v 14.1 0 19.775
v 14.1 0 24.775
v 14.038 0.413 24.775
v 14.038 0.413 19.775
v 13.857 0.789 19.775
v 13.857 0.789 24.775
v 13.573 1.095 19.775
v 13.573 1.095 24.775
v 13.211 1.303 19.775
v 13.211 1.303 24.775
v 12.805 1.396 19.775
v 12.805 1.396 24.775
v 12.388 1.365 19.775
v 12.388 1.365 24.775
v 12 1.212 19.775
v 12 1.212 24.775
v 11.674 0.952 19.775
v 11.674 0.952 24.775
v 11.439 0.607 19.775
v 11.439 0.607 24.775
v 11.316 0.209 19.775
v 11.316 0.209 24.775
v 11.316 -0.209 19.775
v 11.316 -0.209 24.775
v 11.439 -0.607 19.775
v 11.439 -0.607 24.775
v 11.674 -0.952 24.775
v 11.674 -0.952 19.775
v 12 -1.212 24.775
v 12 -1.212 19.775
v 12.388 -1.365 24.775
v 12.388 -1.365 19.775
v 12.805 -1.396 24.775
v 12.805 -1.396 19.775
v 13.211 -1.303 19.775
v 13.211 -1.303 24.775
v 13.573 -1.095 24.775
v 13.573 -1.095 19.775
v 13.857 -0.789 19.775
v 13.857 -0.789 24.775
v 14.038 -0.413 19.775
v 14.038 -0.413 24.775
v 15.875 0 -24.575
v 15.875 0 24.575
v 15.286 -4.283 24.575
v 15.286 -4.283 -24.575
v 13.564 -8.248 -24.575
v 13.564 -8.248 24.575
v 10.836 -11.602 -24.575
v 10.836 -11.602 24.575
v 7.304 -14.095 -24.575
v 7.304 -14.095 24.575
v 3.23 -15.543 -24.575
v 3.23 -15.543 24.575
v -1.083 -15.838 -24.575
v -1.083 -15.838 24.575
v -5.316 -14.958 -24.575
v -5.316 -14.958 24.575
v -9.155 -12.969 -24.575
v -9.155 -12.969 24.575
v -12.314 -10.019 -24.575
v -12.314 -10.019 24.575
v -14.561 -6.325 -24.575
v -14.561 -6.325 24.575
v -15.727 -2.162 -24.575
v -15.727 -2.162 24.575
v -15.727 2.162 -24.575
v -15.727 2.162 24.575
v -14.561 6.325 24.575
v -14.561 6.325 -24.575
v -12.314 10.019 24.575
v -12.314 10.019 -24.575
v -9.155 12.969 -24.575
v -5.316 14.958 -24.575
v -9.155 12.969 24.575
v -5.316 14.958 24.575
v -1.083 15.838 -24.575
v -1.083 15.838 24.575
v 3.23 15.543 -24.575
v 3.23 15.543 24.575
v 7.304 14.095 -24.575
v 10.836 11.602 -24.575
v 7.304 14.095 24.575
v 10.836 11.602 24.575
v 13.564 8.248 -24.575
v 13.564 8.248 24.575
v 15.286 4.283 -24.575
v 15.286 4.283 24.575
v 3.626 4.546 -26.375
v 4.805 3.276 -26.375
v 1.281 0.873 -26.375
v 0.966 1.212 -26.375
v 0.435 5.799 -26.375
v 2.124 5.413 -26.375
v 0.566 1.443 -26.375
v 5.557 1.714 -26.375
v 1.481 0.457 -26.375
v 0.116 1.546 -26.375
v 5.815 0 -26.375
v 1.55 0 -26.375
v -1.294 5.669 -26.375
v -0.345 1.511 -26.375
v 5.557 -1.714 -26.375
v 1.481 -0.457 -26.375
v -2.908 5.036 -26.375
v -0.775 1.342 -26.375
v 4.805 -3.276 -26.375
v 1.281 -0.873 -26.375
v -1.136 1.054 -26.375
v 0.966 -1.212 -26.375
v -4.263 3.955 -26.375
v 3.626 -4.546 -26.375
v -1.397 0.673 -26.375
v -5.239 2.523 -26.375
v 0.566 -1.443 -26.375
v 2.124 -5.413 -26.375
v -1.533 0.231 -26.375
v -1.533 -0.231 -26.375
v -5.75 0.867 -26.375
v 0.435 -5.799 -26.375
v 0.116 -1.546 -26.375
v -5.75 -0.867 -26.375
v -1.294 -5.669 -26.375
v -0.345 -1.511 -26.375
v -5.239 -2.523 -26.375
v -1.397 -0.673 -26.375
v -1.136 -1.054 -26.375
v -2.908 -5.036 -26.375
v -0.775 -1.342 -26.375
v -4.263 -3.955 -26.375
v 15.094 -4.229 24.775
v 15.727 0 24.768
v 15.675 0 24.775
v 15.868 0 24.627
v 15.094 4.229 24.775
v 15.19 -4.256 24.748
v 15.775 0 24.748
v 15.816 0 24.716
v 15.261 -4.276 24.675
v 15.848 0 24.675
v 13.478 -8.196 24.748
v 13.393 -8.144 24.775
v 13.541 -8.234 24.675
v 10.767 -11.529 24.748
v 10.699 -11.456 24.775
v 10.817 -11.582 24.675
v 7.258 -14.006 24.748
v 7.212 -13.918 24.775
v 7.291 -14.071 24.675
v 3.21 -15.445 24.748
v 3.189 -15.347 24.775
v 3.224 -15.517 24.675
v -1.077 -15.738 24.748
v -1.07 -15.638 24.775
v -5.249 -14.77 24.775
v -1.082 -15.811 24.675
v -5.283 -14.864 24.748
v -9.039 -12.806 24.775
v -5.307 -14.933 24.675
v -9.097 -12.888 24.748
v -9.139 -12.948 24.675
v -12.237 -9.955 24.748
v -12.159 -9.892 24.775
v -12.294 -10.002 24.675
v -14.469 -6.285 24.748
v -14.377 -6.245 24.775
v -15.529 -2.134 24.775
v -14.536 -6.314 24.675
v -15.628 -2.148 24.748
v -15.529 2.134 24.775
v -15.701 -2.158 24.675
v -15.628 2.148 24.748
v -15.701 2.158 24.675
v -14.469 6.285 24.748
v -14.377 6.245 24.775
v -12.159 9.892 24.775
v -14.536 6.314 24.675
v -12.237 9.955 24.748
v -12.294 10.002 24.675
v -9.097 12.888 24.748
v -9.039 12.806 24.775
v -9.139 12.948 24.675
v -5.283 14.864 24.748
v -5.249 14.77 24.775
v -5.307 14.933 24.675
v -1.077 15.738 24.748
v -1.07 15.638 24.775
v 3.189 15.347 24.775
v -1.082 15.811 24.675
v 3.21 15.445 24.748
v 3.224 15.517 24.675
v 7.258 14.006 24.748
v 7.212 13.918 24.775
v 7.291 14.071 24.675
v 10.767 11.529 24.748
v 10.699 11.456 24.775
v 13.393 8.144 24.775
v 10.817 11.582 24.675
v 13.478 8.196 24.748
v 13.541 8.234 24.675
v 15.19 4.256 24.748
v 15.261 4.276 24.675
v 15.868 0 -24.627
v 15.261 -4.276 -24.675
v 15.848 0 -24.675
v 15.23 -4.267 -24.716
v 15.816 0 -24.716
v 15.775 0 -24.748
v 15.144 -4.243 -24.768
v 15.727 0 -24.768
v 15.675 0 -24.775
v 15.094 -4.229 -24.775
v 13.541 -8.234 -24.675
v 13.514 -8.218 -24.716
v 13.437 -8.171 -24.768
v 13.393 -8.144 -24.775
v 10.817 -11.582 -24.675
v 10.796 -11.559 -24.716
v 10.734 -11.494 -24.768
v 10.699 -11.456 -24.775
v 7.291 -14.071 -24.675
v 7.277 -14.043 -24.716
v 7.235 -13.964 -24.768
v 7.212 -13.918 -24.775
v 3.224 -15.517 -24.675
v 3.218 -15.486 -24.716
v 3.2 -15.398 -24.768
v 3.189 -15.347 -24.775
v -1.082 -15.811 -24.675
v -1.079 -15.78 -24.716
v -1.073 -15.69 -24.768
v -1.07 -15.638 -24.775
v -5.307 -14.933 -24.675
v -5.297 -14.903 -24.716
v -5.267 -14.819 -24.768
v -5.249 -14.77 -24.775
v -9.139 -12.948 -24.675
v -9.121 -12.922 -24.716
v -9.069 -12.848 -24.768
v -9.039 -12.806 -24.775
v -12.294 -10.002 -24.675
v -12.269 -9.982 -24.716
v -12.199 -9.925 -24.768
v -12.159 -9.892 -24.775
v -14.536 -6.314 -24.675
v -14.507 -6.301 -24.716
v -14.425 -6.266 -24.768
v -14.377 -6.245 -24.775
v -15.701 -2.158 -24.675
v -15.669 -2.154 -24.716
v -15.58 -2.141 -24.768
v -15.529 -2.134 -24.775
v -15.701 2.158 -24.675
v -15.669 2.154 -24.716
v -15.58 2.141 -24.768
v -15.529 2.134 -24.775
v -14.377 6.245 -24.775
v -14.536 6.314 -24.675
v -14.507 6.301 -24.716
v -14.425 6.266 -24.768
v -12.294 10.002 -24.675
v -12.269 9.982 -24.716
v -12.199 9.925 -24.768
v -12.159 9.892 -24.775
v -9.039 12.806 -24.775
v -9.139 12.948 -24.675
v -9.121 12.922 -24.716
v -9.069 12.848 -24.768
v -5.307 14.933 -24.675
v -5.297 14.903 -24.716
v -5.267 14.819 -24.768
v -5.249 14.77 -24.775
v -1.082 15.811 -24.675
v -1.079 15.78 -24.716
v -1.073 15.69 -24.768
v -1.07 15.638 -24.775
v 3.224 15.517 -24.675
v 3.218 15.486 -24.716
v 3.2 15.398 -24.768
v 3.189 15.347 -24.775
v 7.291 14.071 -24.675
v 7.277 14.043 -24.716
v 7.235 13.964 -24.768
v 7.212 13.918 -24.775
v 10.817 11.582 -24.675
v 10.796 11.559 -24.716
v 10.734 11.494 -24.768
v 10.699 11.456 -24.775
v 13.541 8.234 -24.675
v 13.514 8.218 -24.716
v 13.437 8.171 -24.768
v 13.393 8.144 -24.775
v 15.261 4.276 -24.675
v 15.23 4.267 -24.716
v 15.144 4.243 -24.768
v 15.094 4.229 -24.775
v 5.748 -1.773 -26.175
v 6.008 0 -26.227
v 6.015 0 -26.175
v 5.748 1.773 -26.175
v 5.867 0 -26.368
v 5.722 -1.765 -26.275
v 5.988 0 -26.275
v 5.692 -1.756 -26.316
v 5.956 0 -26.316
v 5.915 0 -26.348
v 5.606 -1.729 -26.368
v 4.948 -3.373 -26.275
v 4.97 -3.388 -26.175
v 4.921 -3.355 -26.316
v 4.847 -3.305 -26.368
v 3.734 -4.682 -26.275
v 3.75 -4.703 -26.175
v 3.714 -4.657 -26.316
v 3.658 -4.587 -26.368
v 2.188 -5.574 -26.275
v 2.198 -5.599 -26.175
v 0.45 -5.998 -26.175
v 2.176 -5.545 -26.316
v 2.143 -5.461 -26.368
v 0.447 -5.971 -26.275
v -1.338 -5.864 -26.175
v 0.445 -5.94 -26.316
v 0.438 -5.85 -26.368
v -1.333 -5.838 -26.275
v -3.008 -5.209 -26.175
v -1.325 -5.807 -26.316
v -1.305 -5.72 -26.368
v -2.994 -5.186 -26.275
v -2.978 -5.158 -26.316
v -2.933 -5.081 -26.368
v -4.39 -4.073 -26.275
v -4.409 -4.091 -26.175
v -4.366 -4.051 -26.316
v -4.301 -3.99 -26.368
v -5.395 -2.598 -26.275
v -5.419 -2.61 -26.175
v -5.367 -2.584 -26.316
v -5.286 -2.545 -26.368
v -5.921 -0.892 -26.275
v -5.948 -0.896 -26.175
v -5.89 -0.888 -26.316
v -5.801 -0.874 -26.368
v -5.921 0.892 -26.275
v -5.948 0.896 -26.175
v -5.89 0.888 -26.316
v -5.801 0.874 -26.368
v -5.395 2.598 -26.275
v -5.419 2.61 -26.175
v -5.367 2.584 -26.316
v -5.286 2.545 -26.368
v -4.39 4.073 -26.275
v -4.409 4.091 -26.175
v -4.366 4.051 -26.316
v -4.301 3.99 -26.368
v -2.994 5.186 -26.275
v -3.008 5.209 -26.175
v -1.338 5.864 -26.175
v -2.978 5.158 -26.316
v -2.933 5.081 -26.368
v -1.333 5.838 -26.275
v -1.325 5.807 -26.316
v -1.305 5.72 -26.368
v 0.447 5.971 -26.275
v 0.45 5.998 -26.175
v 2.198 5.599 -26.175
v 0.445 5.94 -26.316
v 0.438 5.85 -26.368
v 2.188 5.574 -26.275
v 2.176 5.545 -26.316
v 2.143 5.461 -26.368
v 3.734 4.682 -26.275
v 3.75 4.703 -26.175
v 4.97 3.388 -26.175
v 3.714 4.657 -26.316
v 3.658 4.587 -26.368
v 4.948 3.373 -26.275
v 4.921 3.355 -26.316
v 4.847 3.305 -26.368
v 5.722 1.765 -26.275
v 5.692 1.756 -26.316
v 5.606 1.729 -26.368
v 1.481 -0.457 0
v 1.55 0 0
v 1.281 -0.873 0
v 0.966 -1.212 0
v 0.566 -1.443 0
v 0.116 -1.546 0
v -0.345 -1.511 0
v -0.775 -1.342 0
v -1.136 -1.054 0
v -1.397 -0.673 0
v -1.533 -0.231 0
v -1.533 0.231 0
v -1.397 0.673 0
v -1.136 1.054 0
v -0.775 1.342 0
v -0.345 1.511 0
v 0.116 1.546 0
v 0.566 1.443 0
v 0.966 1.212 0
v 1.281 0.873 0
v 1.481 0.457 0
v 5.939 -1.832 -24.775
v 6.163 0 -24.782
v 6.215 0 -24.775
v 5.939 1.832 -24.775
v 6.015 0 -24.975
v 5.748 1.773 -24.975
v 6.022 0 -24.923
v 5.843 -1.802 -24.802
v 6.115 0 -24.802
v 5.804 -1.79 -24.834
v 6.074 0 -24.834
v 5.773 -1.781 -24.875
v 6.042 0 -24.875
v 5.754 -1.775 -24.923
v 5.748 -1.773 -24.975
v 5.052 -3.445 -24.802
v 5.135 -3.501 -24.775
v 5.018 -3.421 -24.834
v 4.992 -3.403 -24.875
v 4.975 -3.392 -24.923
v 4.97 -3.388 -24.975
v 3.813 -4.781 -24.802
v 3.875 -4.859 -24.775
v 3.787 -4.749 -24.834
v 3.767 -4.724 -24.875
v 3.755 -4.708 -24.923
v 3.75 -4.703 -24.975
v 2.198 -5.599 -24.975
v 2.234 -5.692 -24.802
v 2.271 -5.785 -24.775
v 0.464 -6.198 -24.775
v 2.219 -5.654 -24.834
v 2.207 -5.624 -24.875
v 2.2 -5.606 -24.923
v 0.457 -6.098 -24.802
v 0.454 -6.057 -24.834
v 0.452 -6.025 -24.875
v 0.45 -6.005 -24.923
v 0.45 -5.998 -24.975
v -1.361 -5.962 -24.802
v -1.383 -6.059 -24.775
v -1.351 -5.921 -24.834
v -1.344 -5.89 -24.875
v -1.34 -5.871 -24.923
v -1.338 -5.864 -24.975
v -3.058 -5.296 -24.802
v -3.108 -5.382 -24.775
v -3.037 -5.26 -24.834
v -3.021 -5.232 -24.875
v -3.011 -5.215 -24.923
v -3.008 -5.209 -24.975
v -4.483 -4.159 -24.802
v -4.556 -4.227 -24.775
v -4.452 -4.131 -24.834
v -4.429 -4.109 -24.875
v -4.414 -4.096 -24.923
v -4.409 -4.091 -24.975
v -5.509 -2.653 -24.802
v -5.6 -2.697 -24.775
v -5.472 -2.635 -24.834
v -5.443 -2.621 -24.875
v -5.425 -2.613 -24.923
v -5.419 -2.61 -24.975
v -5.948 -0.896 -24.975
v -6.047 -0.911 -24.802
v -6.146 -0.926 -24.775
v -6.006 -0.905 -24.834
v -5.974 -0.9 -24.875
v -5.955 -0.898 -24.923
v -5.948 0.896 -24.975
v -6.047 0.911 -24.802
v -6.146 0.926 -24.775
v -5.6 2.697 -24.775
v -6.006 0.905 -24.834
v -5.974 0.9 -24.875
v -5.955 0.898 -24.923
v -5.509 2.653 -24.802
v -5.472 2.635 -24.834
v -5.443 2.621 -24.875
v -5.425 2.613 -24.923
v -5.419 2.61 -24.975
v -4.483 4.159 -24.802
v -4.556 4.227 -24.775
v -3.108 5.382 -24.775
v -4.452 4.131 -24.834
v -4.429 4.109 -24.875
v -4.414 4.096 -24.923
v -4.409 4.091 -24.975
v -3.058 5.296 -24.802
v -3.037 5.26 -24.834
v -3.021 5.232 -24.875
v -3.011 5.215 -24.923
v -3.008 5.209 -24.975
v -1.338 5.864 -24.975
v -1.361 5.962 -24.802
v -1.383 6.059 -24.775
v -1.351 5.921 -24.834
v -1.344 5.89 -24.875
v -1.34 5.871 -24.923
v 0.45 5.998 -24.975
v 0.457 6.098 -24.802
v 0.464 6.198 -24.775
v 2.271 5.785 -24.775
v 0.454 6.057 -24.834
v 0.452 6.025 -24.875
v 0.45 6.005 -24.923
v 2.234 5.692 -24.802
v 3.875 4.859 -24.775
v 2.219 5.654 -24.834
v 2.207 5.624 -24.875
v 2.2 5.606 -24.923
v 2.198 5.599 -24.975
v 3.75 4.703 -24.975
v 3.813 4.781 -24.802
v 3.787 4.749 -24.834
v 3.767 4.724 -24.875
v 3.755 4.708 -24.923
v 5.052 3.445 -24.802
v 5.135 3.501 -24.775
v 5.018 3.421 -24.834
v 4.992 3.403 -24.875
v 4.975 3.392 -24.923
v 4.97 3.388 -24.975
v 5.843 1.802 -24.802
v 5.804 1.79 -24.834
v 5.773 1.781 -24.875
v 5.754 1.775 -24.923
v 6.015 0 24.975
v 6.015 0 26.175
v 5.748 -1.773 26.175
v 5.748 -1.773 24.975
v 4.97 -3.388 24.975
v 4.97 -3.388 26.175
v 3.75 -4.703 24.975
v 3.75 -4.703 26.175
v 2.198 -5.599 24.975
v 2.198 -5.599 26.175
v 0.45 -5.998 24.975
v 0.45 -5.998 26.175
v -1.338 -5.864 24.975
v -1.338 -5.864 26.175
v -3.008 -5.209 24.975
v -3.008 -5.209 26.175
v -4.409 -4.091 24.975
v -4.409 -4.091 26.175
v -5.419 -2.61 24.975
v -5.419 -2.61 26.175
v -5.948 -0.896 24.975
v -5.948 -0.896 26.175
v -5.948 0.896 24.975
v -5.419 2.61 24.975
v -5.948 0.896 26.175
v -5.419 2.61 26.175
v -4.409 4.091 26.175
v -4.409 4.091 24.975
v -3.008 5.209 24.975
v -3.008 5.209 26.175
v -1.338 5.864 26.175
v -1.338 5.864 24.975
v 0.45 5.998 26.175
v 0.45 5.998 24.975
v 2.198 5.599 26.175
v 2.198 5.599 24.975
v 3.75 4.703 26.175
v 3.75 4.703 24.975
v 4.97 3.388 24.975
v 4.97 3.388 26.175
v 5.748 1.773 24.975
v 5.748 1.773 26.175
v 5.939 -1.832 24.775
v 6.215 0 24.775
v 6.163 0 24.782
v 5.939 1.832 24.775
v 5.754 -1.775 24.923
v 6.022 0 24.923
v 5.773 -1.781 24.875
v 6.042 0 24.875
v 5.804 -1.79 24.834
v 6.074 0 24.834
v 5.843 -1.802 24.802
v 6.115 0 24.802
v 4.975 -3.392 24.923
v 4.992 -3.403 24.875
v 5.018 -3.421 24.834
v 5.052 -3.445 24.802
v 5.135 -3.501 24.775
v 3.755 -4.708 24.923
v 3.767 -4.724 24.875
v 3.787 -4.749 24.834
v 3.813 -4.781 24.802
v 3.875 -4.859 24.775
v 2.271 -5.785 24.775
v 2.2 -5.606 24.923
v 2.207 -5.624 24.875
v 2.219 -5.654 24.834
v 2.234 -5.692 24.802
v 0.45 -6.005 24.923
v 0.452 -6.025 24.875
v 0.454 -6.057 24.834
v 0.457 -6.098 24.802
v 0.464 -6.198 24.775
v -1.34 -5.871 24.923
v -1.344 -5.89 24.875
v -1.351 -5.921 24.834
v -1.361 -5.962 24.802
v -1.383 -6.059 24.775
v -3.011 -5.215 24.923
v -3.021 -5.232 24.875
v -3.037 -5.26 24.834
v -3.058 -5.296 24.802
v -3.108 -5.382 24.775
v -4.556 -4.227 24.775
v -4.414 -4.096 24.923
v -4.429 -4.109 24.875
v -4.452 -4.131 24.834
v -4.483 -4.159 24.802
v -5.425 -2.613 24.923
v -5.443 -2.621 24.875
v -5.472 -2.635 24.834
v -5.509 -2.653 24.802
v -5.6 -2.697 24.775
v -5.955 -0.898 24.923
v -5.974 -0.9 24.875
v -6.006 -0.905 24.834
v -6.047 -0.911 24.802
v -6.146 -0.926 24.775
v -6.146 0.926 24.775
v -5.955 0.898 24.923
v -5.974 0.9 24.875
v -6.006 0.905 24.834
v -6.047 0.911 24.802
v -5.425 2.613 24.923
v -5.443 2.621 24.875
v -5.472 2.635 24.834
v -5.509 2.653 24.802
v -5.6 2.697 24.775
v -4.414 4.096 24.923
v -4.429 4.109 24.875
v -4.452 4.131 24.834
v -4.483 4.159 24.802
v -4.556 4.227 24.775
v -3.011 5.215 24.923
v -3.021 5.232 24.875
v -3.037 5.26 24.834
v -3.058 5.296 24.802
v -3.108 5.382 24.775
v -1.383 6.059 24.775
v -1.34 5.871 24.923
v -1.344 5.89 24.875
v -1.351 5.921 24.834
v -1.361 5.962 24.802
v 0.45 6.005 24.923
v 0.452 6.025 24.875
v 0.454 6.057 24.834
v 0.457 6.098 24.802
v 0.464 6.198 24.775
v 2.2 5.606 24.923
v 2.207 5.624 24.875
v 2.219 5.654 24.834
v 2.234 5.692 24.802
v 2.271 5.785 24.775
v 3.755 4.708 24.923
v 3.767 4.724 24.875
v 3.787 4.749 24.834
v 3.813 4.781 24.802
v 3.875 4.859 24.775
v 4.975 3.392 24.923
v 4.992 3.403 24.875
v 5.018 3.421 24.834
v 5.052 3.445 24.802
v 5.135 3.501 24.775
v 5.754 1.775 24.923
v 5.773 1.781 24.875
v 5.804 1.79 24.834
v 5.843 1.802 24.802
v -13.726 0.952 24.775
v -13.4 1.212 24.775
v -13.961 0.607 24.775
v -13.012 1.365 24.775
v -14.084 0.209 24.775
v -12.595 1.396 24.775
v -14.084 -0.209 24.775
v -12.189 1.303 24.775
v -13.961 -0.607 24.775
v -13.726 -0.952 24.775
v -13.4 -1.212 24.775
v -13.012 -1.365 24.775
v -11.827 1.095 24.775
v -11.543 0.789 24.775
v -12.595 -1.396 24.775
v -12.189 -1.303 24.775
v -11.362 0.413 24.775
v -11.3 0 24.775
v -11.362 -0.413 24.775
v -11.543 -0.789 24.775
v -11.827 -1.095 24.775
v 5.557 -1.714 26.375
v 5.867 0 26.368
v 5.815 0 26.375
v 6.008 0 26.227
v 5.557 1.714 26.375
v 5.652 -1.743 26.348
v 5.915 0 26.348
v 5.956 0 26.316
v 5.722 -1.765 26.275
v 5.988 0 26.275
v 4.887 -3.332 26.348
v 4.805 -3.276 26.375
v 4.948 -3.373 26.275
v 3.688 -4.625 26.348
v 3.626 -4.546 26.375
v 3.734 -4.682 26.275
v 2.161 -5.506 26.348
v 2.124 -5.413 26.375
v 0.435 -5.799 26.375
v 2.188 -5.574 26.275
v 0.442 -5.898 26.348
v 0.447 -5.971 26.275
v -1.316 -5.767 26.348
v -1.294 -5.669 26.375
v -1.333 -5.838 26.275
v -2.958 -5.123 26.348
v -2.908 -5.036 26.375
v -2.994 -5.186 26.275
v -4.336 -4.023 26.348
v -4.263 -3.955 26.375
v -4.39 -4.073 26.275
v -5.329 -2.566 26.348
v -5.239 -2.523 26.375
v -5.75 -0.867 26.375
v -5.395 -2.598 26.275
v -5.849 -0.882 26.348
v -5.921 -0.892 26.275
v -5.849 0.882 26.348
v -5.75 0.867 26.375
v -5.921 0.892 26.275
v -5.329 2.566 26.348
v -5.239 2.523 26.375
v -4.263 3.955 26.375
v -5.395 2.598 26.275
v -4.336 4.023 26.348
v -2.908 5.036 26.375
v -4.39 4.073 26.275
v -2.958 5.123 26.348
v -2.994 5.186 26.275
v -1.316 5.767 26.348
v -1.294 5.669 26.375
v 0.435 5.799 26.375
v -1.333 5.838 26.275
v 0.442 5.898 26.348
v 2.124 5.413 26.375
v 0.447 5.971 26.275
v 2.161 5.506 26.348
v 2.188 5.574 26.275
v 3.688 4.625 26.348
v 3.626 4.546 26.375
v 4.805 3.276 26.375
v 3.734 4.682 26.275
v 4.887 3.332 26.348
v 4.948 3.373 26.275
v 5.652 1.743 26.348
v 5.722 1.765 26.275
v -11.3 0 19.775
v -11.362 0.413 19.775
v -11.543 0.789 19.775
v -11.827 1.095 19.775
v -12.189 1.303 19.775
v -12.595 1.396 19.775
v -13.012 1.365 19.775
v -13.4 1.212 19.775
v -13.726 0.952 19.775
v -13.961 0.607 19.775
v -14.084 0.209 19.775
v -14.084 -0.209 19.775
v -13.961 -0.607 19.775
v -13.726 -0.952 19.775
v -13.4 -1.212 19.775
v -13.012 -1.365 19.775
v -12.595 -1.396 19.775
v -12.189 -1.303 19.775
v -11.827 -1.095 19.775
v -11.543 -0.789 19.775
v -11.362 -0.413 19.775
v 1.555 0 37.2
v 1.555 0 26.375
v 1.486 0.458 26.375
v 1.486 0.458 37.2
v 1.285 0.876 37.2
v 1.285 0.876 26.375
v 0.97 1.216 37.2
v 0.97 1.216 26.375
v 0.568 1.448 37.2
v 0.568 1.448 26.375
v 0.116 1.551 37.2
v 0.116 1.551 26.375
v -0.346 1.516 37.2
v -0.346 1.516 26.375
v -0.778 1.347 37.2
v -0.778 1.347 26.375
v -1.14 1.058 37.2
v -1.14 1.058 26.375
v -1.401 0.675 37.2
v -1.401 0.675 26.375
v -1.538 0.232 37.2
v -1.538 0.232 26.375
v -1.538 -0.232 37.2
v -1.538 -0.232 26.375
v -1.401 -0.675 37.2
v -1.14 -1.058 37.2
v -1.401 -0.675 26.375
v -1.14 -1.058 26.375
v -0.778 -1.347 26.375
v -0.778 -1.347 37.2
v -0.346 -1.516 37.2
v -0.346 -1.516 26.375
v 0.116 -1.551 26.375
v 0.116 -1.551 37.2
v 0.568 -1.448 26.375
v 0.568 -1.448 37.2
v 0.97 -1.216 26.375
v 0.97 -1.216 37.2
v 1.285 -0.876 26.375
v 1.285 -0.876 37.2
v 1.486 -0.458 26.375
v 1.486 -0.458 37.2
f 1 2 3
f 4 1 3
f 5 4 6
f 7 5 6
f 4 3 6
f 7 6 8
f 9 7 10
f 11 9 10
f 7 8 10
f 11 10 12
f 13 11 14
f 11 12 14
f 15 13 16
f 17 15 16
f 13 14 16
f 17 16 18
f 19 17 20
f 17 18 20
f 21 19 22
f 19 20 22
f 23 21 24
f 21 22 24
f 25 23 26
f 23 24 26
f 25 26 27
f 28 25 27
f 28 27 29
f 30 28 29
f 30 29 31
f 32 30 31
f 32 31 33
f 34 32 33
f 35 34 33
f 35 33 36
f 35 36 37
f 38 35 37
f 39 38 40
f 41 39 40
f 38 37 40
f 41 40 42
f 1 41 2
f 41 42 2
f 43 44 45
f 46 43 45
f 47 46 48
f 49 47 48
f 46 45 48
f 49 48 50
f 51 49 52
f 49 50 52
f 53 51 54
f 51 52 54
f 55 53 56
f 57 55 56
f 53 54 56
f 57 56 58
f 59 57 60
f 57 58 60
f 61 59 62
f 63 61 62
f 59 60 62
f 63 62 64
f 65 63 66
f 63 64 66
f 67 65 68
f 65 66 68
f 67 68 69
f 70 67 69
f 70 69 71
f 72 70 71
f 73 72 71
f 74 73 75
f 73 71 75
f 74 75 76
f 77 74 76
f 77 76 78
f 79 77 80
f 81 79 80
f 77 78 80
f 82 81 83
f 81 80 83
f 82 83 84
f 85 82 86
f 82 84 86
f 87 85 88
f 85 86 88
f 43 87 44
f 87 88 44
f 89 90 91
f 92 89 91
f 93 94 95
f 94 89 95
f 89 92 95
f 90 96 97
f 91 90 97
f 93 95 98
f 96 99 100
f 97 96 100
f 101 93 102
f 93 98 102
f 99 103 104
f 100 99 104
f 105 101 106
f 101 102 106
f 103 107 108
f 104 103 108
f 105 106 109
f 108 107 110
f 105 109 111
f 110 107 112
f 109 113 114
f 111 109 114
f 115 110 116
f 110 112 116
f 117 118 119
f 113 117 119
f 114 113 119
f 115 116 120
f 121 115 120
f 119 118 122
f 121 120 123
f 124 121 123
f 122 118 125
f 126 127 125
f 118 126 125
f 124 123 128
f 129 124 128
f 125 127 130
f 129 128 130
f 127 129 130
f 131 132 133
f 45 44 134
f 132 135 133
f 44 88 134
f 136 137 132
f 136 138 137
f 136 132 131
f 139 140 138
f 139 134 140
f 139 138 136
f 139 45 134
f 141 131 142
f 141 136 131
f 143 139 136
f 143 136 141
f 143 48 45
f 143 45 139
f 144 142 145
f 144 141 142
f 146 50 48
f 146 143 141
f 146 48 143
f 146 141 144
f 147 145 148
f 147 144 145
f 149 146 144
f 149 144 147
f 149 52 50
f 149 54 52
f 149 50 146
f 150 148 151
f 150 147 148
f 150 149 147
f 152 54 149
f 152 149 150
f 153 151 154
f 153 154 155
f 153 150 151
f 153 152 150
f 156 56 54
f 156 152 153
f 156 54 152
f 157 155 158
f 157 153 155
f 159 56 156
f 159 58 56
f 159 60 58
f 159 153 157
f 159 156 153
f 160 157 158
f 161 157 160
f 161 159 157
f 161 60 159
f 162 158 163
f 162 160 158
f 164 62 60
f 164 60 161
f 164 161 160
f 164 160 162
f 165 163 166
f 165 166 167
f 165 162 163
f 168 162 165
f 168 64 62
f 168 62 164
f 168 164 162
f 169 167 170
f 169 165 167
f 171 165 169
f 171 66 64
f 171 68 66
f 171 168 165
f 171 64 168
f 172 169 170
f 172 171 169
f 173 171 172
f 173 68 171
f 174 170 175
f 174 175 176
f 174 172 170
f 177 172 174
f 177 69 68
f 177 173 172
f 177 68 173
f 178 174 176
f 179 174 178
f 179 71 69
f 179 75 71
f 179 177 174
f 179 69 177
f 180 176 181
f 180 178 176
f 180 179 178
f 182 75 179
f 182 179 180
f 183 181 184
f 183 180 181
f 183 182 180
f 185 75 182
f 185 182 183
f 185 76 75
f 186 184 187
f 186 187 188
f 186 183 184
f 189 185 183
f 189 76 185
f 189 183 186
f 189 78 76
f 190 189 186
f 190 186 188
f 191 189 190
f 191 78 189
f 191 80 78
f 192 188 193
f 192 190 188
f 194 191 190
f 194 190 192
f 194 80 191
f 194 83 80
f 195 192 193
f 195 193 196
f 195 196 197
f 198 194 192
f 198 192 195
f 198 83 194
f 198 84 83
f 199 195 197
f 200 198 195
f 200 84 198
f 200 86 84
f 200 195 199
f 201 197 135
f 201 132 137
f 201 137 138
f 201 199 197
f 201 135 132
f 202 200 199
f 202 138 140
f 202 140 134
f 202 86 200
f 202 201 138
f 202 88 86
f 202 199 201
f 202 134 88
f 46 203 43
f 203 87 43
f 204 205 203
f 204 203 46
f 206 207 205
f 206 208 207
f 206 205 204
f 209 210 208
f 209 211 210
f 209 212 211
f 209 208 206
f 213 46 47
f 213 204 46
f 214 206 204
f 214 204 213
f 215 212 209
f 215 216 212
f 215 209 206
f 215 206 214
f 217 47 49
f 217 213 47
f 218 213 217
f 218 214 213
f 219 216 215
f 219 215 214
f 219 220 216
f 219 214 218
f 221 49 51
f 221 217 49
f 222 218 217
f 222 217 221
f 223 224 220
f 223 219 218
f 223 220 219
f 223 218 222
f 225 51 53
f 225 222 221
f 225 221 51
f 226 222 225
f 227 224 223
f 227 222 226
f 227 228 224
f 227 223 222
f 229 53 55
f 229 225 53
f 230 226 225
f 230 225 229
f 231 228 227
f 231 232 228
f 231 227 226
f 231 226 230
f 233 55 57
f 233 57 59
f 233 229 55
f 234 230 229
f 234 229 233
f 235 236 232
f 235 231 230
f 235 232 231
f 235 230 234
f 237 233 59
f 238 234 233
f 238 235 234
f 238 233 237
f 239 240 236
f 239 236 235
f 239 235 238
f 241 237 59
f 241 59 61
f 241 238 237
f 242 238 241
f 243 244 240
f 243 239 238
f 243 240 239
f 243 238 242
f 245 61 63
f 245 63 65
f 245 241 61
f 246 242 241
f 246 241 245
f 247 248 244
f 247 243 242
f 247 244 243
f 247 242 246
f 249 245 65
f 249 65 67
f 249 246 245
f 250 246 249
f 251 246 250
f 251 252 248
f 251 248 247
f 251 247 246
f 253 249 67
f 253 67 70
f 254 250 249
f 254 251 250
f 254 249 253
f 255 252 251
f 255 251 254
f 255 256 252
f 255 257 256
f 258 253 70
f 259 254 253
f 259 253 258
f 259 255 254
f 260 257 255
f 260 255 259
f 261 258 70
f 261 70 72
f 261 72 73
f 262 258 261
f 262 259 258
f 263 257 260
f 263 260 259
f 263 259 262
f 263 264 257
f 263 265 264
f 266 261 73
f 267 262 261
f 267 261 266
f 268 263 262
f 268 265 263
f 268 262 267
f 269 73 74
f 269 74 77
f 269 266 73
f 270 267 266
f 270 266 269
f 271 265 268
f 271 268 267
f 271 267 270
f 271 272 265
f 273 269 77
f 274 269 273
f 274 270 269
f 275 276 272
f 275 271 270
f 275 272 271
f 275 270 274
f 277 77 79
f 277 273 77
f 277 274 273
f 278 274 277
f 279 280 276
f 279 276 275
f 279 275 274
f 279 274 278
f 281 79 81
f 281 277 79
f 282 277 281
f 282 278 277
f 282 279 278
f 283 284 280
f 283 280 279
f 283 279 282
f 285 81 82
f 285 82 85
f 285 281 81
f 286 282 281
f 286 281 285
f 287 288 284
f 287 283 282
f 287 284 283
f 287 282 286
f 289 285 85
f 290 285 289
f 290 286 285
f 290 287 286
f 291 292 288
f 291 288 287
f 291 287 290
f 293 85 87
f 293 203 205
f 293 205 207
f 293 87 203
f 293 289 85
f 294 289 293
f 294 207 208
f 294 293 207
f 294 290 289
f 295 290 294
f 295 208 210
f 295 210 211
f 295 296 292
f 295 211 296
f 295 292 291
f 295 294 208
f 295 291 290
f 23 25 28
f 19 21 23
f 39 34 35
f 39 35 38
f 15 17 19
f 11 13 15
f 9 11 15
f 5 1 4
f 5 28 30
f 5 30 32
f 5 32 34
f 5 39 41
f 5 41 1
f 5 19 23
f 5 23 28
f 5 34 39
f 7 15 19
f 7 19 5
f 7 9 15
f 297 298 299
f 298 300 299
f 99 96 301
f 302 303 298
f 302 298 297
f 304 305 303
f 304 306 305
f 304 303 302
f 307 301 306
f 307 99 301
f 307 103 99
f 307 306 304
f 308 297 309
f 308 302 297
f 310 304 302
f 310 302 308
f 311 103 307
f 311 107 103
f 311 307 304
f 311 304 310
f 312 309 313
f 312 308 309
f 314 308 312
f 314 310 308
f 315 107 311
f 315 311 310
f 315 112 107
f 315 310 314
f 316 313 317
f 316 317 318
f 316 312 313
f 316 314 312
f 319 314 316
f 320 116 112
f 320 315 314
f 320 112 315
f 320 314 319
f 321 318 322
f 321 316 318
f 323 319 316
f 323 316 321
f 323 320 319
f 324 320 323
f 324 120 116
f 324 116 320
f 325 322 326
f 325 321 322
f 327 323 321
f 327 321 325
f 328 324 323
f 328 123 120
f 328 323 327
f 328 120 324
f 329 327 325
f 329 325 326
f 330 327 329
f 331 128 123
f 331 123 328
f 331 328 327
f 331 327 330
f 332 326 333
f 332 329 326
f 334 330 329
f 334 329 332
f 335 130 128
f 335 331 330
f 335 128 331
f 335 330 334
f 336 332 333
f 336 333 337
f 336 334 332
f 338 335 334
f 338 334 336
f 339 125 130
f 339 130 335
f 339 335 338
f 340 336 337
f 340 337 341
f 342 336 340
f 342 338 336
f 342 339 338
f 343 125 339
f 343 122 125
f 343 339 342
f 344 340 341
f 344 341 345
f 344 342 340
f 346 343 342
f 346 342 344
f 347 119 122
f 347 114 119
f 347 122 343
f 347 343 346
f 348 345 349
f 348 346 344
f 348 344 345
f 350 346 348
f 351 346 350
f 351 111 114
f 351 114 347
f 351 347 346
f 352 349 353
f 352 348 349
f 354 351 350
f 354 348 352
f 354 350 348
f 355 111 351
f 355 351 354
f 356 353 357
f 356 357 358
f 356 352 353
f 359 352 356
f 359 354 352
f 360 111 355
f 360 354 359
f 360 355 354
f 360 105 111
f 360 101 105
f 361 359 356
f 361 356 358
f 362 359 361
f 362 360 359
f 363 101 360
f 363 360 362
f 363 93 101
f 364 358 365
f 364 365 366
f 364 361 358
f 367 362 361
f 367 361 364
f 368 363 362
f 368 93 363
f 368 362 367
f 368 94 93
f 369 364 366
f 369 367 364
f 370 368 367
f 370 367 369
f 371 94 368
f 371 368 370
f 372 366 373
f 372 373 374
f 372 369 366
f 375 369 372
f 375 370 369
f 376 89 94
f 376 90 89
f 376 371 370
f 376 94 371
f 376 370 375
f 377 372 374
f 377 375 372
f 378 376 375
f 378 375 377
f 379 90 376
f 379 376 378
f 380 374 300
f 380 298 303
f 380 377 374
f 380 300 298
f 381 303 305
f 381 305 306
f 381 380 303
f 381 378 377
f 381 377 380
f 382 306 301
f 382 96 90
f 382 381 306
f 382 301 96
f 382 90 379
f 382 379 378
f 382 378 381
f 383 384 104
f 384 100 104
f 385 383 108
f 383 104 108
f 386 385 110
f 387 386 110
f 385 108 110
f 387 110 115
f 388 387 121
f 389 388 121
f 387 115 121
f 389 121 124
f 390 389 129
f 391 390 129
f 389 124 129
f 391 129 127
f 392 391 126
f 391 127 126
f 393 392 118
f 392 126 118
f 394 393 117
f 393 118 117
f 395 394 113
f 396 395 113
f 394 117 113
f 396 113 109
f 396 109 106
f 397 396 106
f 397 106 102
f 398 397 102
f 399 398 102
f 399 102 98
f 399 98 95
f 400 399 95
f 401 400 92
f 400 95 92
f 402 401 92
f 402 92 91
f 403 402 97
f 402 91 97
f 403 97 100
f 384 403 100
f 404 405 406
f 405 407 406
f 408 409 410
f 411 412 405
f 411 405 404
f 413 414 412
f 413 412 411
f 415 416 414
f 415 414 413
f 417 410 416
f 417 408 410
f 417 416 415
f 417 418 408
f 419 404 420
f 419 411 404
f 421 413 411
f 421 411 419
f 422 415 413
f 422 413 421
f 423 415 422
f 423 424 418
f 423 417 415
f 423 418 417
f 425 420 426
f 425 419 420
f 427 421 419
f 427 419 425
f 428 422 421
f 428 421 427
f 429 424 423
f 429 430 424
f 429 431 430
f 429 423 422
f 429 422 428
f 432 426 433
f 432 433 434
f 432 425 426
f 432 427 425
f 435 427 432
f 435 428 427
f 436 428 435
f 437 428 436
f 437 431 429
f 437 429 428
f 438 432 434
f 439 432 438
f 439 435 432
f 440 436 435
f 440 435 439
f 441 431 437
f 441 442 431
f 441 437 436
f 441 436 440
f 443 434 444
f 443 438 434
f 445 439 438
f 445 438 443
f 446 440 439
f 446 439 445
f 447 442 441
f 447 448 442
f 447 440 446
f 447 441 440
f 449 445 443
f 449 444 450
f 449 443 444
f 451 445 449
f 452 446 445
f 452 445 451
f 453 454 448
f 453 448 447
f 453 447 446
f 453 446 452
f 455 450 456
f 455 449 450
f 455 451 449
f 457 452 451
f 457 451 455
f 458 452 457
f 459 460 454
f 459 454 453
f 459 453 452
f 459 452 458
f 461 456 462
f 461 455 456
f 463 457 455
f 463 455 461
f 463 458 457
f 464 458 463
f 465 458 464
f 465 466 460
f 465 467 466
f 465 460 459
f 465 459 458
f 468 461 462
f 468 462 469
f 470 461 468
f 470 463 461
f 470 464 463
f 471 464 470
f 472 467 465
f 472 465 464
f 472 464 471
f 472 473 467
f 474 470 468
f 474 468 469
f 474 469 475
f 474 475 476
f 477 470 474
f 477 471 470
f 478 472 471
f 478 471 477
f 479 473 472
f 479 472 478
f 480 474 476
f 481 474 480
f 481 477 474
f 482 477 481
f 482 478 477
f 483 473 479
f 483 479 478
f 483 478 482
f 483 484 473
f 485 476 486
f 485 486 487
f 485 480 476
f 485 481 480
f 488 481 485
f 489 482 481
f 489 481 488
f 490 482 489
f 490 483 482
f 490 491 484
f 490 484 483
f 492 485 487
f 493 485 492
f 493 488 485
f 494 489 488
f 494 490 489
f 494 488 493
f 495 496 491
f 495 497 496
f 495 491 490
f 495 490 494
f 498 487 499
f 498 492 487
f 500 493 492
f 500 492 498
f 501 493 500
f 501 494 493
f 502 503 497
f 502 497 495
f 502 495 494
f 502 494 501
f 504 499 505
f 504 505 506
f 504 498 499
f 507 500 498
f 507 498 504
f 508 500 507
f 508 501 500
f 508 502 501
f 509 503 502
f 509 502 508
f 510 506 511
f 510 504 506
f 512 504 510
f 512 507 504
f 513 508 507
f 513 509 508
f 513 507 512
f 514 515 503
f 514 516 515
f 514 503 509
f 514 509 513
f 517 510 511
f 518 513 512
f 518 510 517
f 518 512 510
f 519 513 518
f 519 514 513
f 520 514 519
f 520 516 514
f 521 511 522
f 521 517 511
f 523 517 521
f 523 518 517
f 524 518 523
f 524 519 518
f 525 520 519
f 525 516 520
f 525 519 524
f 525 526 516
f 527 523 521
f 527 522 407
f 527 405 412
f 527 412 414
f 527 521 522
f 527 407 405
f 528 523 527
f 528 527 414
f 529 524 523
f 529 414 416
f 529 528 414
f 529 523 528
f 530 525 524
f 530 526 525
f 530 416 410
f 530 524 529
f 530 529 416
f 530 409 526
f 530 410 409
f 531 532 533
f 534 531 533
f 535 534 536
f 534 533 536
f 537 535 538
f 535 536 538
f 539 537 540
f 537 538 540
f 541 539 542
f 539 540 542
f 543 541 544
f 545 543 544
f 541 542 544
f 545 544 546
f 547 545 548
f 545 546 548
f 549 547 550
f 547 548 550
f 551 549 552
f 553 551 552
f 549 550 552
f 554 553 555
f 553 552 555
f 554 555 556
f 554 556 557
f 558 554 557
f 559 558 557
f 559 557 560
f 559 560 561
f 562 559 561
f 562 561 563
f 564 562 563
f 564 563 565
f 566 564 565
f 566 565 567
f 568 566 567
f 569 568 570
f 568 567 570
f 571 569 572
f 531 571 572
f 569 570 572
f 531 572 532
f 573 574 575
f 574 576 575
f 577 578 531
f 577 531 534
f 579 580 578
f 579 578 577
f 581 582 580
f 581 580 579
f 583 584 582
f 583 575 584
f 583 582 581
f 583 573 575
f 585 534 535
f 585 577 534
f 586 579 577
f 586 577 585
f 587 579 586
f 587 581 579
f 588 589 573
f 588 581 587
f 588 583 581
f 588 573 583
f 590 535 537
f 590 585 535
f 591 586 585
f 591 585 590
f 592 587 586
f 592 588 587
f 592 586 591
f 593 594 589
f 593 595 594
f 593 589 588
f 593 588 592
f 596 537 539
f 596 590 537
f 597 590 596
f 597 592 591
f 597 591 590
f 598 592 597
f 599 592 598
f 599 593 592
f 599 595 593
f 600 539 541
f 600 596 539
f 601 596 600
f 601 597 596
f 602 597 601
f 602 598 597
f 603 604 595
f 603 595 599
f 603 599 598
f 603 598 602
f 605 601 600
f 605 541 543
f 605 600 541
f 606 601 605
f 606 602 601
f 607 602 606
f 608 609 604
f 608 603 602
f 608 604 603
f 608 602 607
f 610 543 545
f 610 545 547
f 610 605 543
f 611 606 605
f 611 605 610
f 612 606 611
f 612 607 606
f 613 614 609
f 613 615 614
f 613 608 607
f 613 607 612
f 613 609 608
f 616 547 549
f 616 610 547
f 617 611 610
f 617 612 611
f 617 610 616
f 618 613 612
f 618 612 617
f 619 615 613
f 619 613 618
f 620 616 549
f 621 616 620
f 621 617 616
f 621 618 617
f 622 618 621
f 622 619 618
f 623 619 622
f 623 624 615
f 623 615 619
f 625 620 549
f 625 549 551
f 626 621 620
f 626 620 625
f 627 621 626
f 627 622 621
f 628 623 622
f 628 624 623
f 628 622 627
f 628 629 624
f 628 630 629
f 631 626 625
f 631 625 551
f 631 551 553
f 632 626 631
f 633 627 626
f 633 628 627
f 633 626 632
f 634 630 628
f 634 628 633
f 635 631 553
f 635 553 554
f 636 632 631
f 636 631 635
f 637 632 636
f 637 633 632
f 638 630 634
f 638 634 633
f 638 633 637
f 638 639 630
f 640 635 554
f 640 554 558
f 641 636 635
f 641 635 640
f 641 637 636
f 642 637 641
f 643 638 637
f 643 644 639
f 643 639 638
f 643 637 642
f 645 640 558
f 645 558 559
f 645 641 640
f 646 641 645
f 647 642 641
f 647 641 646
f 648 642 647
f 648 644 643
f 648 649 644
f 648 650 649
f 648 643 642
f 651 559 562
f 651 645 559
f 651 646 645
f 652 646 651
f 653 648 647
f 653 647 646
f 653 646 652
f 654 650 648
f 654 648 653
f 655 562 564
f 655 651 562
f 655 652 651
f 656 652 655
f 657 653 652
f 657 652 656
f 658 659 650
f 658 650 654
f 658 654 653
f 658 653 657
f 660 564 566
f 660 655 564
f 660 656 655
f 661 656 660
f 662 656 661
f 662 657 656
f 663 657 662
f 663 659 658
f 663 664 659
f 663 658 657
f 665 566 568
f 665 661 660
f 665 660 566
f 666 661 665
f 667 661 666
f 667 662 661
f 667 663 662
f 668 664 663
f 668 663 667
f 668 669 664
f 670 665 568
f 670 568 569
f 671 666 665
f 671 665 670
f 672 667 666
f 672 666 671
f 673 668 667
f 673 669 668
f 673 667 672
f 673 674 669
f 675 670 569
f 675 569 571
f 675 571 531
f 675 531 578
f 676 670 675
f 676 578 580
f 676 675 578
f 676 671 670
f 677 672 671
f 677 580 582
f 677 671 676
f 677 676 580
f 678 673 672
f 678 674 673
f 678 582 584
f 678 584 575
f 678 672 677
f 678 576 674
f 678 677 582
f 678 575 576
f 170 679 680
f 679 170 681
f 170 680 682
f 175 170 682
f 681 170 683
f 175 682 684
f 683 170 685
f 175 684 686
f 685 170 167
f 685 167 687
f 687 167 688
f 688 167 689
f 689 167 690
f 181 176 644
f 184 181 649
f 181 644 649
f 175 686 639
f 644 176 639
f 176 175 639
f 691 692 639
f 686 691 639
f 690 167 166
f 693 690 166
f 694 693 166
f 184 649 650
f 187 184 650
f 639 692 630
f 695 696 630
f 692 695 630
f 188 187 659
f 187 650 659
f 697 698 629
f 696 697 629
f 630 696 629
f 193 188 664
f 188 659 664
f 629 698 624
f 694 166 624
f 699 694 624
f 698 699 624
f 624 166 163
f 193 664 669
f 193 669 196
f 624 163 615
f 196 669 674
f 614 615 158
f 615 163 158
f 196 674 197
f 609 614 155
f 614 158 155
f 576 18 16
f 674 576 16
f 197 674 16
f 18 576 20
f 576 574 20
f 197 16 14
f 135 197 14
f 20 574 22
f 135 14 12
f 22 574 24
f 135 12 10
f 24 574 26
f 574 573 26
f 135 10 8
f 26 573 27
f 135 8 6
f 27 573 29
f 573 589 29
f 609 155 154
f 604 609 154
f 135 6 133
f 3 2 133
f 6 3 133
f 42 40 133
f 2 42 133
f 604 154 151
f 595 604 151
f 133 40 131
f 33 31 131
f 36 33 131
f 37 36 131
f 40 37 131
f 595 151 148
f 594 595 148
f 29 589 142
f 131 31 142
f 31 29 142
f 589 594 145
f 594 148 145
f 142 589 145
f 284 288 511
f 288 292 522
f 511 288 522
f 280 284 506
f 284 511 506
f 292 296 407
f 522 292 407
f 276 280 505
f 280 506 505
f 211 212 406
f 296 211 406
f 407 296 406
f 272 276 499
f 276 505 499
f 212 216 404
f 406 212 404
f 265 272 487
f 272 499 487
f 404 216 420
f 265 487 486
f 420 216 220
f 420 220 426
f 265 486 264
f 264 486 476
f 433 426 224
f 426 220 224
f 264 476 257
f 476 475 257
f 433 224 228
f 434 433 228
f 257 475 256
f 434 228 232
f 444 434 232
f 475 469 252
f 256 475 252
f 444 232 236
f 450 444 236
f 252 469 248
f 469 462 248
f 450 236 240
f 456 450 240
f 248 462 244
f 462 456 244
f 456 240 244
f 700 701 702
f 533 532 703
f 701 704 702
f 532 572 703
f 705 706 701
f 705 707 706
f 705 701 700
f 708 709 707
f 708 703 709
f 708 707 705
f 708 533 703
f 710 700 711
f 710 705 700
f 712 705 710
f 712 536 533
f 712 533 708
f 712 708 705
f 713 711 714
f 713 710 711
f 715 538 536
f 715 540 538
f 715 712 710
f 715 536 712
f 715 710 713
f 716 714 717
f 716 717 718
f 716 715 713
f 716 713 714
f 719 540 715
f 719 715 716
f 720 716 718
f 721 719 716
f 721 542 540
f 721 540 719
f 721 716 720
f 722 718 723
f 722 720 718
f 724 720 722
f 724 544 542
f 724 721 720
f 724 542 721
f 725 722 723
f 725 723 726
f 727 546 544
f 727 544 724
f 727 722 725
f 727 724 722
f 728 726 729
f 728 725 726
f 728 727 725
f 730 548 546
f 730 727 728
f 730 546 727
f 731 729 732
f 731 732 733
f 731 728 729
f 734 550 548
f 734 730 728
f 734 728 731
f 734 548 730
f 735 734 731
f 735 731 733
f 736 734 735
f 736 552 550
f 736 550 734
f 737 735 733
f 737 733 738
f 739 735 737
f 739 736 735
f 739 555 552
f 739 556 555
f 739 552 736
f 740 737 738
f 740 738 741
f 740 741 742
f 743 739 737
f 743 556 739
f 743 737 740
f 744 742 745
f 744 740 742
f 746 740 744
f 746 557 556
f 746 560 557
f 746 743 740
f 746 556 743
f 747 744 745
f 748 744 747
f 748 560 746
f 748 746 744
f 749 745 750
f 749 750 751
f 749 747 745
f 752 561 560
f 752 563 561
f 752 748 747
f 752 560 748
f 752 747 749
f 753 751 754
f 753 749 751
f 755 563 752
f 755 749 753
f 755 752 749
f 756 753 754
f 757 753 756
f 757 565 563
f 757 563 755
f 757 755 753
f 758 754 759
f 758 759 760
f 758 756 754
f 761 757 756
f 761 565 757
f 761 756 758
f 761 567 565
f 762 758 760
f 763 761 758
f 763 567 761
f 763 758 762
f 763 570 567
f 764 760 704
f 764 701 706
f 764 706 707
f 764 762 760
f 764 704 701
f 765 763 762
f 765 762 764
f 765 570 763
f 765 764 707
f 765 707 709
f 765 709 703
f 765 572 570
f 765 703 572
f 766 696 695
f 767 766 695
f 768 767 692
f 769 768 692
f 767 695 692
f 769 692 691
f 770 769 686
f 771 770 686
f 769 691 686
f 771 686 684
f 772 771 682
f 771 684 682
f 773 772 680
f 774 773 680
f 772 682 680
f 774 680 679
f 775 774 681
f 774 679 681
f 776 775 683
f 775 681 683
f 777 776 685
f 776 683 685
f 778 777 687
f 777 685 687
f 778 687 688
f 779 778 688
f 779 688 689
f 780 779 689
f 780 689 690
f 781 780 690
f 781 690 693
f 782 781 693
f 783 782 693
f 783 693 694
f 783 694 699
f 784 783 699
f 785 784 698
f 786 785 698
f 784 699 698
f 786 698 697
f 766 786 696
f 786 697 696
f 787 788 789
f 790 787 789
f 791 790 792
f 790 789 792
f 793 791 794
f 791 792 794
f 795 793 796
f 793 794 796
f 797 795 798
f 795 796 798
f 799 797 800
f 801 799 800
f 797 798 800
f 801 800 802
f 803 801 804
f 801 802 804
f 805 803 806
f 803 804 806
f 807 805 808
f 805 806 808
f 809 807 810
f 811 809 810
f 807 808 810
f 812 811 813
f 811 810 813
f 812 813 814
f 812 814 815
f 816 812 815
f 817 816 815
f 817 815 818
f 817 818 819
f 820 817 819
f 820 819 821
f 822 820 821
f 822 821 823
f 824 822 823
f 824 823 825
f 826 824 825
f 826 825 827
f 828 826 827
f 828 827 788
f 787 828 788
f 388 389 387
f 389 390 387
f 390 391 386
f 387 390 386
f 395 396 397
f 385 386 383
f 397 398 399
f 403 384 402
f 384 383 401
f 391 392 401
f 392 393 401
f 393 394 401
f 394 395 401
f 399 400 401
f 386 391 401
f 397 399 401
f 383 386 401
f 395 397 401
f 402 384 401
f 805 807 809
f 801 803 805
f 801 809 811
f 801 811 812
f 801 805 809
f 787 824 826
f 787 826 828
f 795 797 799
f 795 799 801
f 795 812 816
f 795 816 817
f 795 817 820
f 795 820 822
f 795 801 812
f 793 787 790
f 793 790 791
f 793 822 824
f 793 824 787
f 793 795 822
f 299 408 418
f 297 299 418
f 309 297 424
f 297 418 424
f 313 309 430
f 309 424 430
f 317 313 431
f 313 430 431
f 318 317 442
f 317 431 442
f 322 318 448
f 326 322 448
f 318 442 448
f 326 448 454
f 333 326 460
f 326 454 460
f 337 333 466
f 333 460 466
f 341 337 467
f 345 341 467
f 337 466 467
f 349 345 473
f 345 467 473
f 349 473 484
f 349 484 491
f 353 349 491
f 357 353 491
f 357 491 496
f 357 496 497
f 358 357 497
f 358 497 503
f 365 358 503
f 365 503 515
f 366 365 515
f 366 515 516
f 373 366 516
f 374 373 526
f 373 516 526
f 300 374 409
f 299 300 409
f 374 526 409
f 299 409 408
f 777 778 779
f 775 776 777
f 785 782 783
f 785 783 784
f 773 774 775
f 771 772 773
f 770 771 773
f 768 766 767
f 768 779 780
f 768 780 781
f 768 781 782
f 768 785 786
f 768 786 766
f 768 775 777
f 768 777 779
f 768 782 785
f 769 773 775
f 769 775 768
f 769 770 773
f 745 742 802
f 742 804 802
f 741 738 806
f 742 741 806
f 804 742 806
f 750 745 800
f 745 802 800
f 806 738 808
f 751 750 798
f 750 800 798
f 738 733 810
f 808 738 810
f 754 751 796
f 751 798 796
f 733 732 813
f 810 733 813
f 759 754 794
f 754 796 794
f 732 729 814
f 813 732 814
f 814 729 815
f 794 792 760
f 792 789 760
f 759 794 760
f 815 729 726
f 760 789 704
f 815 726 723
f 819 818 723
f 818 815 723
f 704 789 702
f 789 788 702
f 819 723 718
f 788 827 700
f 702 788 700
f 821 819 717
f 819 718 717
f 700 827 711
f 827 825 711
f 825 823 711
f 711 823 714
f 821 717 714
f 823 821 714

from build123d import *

# Parameters (mm, degrees)
SKETCH4_R             = 1.555
SHAFT_DEPTH           = 37.2
FILLET1_R             = 0.2
SKETCH6_R             = 1.4
F_6_32_THREADED_DEPTH = 5


with BuildPart() as part:
    # Sketch2 → body (revolve)
    with BuildSketch(Plane(origin=(0, 0, 0), x_dir=(1, 0, 0), z_dir=(0, 1, 0))):
        Polygon((1.55, -26.375), (1.55, 26.375), (6.015, 26.375), (6.015, 24.775), (15.875, 24.775), (15.875, -24.775), (6.015, -24.775), (6.015, -26.375), align=None)
    revolve(axis=Axis((0, 0, 0), (0, 0, -1)))

    # Sketch4 → shaft (add)
    with BuildSketch(Plane.XY):
        Circle(SKETCH4_R)
    extrude(amount=SHAFT_DEPTH)

    # Fillet1
    fillet1_edges = [part.edges().sort_by_distance(p)[0] for p in [
        (-6.015, 0, 26.375),
        (-6.015, 0, 24.775),
        (-15.875, 0, 24.775),
        (-15.875, 0, -24.775),
        (-6.015, 0, -24.775),
        (-6.015, 0, -26.375),
    ]]
    fillet(fillet1_edges, radius=FILLET1_R)

    # Sketch6 → #6-32 threaded (cut)
    with BuildSketch(Plane.XY.offset(24.775)):
        with Locations((-12.7, 0)):
            Circle(SKETCH6_R)
        with Locations((12.7, 0)):
            Circle(SKETCH6_R)
    extrude(amount=-F_6_32_THREADED_DEPTH, mode=Mode.SUBTRACT)


solid = part.part
